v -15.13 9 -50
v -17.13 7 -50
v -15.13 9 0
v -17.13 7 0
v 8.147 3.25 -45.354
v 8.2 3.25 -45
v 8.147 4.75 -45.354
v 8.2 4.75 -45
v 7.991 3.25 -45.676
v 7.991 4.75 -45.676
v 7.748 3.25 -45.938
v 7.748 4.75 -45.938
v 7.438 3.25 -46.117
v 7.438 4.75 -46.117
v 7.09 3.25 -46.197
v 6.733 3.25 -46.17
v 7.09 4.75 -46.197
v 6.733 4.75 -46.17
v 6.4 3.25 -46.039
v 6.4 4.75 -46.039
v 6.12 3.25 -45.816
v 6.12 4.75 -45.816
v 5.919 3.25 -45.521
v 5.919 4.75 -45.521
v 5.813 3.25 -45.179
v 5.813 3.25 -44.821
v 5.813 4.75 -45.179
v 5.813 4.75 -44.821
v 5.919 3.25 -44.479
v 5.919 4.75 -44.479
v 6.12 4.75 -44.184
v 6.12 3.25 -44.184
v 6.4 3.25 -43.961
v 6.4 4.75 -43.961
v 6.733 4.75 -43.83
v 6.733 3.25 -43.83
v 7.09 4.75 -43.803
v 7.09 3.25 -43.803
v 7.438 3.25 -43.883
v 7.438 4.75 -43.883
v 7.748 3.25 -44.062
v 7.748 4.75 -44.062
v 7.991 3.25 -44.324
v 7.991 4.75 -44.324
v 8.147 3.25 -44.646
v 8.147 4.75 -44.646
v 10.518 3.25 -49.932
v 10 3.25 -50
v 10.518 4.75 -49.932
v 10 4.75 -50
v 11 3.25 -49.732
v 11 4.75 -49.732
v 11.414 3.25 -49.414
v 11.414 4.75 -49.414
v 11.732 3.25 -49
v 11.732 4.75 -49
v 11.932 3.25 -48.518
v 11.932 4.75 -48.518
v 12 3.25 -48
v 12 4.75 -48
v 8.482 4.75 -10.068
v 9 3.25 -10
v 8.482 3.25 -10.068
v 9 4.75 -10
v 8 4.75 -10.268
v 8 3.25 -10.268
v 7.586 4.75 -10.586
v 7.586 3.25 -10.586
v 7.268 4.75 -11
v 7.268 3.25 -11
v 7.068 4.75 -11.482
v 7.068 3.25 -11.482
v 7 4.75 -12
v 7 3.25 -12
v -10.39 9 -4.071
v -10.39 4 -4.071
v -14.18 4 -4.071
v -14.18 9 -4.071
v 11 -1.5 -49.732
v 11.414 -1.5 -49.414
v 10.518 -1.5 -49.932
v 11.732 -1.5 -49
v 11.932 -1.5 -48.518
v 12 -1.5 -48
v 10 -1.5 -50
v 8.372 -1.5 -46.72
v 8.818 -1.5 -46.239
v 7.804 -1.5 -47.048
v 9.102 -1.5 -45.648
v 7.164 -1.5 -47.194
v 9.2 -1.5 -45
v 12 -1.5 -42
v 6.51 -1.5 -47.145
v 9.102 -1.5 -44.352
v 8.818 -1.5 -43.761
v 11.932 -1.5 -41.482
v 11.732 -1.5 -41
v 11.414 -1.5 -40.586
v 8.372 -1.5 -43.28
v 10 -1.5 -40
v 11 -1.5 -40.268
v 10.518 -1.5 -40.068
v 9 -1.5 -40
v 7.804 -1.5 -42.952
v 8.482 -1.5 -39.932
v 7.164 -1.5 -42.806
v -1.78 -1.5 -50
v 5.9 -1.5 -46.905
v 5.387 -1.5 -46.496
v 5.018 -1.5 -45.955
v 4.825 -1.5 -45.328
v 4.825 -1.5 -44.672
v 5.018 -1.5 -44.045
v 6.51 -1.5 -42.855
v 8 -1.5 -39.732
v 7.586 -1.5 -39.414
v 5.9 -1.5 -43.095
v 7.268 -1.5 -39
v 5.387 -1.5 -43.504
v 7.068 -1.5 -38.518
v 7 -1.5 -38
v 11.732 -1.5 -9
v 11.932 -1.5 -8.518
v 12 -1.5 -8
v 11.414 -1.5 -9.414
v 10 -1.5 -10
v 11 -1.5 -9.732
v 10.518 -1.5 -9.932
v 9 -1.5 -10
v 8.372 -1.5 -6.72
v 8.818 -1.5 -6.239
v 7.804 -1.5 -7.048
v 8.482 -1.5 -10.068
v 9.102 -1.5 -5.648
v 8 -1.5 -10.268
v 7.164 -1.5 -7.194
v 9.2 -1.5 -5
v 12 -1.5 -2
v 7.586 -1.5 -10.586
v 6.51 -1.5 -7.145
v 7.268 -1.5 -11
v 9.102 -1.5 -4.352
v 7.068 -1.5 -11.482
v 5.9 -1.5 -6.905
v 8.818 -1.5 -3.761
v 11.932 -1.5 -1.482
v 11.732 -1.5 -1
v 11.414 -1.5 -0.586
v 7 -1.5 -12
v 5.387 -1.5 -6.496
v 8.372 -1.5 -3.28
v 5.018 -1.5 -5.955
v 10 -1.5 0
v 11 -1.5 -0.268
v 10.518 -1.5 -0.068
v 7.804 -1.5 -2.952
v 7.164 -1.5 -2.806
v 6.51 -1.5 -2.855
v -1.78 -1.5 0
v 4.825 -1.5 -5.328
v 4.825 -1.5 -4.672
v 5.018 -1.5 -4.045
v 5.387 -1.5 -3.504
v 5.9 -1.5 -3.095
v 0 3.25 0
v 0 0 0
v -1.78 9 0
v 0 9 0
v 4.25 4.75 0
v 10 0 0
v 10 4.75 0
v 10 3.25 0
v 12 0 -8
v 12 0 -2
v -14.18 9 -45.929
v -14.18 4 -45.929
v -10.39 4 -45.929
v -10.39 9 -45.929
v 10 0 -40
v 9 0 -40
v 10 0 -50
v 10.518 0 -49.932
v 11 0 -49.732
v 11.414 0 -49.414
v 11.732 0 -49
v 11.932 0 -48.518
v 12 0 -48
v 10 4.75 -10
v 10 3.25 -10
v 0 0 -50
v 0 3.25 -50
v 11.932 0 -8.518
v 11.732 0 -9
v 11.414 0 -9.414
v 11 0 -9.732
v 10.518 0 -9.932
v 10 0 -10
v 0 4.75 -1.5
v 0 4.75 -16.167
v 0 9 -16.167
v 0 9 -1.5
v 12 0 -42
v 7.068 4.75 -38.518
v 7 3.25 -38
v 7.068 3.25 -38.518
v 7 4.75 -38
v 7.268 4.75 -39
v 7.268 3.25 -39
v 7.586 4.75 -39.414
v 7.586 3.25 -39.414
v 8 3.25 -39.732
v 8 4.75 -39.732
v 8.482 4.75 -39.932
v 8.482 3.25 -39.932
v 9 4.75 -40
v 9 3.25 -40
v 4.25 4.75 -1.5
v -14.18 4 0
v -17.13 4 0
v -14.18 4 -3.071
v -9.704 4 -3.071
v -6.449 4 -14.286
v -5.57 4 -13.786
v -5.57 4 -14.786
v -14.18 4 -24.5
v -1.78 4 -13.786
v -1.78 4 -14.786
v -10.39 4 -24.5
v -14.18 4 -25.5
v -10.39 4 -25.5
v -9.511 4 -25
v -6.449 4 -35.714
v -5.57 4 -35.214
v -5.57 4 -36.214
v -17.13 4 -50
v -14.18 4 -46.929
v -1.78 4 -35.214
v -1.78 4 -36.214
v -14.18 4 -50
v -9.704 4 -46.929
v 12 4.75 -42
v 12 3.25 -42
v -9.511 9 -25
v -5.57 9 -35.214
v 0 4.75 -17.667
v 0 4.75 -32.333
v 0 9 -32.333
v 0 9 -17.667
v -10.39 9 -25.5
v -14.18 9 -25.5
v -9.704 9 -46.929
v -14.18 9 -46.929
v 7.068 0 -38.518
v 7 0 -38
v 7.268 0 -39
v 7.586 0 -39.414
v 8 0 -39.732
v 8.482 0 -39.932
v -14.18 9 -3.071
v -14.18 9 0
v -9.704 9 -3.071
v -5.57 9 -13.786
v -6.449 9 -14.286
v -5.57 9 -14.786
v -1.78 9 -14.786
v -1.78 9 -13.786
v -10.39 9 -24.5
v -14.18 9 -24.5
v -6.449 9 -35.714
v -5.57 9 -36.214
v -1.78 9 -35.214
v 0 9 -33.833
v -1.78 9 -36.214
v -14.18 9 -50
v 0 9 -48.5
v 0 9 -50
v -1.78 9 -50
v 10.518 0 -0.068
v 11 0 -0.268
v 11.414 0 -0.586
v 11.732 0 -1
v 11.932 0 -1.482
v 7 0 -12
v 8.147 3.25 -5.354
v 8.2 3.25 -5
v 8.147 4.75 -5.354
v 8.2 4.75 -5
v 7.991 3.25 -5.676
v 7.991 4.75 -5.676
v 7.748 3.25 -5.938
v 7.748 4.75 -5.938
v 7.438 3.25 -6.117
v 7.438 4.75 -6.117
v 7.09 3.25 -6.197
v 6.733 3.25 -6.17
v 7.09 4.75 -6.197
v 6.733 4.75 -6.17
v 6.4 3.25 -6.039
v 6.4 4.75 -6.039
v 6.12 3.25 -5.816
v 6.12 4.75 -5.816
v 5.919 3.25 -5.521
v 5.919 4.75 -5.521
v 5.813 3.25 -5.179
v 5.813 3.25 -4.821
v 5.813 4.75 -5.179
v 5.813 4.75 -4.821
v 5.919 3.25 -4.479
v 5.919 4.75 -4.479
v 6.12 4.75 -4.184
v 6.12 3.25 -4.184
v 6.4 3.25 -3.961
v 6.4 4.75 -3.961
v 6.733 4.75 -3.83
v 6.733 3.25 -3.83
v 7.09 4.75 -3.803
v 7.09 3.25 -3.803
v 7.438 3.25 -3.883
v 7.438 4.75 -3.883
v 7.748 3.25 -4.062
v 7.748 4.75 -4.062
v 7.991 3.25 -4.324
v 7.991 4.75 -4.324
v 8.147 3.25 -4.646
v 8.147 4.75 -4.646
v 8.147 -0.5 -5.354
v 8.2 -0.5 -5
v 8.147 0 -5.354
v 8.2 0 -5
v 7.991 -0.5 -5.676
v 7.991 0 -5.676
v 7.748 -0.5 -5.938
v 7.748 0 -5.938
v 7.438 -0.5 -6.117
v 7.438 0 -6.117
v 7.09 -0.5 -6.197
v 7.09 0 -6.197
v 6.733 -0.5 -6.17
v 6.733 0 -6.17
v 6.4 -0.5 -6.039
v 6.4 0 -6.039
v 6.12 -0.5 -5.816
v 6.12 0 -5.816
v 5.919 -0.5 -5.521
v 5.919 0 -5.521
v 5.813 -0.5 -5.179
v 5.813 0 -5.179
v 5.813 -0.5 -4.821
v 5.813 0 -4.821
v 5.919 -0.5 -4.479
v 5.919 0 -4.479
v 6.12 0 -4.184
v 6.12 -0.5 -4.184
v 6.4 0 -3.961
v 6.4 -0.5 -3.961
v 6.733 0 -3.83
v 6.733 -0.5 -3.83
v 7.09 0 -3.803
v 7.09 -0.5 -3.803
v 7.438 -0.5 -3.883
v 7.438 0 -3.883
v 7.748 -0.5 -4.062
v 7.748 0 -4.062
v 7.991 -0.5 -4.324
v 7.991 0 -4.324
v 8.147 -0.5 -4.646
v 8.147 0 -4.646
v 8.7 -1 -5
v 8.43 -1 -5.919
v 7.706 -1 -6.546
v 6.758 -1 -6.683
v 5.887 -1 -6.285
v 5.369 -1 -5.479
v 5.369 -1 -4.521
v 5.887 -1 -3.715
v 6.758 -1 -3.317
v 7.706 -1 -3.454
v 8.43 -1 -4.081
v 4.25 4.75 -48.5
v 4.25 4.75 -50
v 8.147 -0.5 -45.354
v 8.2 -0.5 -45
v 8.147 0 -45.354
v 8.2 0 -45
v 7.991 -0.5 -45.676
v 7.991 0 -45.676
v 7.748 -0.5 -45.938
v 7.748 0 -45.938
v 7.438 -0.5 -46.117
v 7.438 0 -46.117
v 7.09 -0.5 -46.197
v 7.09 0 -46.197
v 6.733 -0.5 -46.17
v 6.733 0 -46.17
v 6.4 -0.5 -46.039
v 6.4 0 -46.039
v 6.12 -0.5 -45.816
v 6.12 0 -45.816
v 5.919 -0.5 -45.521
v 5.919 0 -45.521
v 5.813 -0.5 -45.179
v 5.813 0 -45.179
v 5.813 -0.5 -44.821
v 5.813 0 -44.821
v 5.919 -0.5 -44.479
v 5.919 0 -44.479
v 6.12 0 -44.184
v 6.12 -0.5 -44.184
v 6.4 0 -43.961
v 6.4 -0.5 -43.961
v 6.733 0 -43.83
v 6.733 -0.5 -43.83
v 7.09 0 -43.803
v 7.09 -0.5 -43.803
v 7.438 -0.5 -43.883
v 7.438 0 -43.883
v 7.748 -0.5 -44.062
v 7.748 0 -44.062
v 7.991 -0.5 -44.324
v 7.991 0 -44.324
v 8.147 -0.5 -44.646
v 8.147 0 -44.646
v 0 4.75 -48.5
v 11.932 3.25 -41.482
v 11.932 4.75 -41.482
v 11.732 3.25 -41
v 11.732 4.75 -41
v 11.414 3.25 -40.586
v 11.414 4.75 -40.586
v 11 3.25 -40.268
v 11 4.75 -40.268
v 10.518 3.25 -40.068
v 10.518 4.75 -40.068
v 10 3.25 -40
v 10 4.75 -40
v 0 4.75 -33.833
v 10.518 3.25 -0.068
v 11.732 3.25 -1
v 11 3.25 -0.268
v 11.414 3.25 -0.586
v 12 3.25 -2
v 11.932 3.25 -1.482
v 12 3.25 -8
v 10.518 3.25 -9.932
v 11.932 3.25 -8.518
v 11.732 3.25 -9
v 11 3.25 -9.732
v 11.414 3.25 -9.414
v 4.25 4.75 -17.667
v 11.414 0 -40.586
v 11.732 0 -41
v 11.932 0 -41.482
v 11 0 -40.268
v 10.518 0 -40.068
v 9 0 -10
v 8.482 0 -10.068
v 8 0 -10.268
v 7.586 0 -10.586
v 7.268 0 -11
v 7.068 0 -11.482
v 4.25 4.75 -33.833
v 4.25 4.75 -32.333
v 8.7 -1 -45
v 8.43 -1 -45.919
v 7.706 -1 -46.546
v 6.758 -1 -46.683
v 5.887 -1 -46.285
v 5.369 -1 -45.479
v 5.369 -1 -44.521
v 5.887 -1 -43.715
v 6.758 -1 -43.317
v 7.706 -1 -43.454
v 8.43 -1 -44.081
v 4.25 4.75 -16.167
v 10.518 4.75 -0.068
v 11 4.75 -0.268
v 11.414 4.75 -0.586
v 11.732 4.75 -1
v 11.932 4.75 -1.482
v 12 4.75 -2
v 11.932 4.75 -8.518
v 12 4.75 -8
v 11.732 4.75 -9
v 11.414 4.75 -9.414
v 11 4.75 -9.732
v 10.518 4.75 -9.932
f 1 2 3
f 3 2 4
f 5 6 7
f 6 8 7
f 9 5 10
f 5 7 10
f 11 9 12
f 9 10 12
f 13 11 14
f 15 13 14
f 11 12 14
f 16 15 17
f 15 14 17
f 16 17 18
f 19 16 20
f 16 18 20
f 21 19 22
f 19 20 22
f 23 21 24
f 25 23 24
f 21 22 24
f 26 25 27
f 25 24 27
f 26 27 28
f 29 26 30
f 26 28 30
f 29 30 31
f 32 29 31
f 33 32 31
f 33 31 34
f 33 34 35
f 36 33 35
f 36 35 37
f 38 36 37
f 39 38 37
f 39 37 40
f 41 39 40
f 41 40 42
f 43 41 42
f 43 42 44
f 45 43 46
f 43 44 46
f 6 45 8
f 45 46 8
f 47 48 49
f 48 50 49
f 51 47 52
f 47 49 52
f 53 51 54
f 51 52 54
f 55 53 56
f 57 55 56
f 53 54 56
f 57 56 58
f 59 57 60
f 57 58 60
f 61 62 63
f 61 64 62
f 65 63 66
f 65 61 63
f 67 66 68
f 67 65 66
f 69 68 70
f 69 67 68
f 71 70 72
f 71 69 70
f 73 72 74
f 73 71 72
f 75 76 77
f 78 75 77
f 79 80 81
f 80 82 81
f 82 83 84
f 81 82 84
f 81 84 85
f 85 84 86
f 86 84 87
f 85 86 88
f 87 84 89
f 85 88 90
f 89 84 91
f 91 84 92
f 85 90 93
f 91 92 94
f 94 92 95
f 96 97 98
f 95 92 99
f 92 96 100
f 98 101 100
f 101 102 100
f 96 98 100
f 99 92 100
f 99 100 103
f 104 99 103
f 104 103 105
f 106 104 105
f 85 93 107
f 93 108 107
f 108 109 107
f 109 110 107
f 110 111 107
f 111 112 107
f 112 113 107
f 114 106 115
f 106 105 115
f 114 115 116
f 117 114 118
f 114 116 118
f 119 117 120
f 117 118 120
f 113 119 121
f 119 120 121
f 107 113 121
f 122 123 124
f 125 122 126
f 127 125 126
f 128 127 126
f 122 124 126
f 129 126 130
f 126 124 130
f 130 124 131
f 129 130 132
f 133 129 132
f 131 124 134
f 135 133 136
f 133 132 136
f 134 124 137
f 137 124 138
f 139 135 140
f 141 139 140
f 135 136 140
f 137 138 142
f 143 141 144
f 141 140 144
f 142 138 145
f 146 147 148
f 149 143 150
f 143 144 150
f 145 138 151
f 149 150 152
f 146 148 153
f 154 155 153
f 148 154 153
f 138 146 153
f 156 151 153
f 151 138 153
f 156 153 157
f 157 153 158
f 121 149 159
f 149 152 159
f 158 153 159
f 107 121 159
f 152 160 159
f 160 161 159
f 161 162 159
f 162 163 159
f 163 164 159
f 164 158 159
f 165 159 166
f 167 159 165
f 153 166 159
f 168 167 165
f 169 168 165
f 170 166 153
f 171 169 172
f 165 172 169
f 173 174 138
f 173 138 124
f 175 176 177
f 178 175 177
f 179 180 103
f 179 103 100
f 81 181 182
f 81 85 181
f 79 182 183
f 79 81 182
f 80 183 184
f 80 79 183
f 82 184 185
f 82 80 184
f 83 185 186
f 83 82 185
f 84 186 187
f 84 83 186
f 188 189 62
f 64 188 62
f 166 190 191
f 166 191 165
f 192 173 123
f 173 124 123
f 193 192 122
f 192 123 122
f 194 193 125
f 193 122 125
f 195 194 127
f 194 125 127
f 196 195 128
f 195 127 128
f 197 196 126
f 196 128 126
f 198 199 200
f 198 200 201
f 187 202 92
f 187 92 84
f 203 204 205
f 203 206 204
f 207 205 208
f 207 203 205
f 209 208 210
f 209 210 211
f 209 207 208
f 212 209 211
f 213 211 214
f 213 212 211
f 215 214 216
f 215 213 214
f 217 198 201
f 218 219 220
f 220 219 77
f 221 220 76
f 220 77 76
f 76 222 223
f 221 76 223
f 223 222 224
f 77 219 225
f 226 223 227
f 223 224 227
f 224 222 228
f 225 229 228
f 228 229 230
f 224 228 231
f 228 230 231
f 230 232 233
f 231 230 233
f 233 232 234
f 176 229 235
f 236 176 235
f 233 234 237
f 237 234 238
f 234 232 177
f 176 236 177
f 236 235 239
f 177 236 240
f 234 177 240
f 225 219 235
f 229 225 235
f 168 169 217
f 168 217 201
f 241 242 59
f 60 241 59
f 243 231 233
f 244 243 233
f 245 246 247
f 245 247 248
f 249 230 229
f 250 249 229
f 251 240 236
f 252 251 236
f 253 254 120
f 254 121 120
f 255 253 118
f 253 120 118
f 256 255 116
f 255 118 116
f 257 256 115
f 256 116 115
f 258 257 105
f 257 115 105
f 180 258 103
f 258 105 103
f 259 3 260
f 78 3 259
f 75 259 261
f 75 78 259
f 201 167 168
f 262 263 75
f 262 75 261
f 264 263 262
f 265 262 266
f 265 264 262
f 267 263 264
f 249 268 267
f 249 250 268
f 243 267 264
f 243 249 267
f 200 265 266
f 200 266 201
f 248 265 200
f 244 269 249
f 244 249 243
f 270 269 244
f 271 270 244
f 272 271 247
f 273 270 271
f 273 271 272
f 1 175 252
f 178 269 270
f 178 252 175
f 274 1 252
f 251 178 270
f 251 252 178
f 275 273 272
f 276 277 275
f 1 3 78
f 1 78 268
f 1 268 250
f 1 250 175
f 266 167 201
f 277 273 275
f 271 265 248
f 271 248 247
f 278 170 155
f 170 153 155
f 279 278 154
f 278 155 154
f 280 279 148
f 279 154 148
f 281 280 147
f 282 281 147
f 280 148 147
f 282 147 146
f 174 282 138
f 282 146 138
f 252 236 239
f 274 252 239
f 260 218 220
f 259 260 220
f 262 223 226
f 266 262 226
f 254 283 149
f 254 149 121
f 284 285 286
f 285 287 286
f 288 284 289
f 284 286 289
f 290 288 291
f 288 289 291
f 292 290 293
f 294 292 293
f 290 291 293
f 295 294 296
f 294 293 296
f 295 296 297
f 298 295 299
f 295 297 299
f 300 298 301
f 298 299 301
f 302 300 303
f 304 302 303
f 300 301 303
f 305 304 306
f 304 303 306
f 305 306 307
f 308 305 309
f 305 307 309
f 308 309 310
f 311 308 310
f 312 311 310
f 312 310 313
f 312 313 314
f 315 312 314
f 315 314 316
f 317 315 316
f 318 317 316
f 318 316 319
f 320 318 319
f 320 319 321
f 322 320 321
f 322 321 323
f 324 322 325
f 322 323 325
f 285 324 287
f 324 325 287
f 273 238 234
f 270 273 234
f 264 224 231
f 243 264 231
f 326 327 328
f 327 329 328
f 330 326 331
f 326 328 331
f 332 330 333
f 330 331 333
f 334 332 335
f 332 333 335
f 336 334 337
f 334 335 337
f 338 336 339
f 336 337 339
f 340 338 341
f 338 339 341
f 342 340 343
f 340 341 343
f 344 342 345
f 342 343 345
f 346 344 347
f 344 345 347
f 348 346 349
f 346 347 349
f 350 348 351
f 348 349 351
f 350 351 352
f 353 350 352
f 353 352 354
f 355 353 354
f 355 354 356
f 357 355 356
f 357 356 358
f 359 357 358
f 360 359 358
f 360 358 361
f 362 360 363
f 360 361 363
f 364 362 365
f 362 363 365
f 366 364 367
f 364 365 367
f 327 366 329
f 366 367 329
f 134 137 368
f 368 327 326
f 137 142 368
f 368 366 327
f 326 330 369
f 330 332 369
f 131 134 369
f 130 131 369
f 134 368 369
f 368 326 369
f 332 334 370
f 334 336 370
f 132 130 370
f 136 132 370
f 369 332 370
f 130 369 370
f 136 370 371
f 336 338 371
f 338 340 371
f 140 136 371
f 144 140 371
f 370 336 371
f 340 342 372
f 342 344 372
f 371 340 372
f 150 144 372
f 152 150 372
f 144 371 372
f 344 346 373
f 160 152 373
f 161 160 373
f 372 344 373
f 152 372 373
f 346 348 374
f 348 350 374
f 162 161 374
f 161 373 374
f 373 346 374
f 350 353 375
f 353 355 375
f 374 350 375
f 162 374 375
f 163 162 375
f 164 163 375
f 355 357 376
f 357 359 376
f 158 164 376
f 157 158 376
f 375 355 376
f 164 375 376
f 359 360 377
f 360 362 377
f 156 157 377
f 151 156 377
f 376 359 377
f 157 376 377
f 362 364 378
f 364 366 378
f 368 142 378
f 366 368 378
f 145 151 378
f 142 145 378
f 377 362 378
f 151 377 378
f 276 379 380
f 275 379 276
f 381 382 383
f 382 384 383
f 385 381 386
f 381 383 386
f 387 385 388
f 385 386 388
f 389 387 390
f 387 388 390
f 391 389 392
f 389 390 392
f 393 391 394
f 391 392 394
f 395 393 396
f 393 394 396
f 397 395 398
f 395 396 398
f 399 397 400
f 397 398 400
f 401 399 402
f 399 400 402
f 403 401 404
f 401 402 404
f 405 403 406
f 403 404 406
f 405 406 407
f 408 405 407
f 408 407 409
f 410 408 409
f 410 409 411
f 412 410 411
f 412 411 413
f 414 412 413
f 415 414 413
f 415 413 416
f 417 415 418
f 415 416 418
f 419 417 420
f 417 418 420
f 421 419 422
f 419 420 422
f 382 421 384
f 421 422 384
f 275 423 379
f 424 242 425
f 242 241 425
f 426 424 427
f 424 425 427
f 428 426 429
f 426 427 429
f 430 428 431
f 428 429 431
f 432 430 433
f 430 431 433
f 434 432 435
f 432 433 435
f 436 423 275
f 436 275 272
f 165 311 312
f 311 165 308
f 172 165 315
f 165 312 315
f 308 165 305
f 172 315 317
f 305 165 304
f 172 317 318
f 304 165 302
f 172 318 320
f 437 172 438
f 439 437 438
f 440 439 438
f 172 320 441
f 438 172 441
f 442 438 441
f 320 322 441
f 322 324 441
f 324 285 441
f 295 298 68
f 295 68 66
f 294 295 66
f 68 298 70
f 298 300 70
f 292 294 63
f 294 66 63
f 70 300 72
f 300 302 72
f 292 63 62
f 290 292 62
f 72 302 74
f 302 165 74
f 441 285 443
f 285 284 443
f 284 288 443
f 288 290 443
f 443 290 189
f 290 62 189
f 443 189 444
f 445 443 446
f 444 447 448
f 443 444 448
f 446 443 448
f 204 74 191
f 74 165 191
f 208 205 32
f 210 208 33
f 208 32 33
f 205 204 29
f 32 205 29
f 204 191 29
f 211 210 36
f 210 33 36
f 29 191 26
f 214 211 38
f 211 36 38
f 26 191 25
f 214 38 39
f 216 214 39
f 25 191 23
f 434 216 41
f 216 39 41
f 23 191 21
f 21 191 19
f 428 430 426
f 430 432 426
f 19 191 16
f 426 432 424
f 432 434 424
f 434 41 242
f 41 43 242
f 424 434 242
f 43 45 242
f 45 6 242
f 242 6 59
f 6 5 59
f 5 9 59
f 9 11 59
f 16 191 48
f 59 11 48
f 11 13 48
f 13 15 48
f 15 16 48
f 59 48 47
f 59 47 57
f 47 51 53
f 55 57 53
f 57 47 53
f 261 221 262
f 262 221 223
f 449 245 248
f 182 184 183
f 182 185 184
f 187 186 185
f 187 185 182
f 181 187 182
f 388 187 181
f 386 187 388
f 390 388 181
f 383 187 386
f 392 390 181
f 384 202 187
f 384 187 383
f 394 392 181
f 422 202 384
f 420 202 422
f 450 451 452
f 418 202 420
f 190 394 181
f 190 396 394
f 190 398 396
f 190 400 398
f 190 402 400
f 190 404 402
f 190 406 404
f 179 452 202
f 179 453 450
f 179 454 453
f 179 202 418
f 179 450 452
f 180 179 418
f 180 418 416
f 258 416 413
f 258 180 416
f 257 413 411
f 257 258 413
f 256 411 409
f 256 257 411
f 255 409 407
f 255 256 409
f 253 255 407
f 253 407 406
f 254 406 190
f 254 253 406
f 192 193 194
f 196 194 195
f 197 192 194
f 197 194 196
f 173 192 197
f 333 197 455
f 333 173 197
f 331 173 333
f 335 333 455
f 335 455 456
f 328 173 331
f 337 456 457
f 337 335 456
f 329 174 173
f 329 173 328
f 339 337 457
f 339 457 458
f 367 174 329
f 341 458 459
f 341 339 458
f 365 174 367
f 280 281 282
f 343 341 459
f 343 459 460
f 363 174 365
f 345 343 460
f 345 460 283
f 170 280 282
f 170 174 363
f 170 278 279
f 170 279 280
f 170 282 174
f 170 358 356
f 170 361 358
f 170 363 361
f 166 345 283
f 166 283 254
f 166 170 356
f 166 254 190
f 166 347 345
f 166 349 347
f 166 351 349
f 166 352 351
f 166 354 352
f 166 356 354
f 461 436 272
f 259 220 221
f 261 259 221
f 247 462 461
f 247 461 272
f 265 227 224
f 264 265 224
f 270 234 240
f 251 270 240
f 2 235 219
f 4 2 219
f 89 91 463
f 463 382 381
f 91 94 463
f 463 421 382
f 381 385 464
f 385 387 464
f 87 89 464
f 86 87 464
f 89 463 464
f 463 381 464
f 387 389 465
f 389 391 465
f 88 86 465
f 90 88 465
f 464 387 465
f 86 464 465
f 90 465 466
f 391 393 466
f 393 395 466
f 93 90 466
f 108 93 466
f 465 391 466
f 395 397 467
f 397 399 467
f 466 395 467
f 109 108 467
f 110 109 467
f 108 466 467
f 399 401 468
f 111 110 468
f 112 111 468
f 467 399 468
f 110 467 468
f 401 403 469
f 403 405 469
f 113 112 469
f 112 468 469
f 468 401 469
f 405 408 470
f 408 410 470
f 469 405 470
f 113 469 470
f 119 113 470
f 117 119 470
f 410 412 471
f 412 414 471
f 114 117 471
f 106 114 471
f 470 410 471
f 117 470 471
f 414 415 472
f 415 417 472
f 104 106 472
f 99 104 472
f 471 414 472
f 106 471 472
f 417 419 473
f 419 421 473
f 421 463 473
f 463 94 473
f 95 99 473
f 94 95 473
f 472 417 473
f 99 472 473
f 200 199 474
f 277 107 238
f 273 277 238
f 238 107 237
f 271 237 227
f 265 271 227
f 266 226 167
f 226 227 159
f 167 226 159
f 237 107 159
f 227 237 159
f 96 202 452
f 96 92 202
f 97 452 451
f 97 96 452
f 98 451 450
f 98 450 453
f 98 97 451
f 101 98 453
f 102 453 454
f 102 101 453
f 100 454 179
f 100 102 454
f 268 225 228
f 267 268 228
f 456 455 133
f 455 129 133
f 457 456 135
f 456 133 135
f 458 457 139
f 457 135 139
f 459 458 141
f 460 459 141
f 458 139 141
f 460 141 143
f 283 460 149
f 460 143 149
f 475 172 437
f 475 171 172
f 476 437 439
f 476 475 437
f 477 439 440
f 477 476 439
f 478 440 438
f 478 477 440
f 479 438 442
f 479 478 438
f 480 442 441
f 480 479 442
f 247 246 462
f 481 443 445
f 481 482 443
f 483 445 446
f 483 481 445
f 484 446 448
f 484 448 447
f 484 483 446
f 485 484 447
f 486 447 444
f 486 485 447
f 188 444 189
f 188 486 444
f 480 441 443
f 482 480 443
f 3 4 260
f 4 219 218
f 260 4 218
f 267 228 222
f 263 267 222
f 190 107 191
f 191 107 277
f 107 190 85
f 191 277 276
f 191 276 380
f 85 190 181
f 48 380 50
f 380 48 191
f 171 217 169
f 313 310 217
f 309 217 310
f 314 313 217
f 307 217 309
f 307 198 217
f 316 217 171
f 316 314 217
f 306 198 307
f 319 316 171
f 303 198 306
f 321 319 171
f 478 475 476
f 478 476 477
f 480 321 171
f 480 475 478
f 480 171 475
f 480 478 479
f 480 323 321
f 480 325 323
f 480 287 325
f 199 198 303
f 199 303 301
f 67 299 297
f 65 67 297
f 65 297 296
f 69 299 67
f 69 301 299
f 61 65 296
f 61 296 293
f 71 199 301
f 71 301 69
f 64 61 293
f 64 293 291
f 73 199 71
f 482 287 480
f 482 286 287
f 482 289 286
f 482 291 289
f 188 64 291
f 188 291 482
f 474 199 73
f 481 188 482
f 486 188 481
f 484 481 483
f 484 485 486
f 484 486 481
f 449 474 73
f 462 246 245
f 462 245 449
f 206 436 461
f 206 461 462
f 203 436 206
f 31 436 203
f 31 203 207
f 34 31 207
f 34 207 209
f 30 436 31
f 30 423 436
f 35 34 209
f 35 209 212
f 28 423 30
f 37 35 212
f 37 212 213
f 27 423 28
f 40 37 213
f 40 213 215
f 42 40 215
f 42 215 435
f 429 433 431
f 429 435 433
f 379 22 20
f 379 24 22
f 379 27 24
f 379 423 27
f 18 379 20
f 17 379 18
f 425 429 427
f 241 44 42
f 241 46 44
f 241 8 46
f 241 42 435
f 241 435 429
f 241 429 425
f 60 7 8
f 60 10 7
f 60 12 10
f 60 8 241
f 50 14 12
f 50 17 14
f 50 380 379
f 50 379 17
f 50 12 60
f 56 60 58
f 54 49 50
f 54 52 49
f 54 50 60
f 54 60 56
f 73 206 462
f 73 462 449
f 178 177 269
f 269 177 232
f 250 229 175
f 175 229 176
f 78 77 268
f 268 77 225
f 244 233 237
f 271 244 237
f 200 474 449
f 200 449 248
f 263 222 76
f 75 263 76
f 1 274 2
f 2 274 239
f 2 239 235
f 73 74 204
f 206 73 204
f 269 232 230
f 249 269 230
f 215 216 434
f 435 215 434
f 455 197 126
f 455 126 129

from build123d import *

# Parameters (mm, degrees)
BOSS_EXTRUDE1_DEPTH                             = 5
BOSS_EXTRUDE3_DEPTH                             = 1.5
BOSS_EXTRUDE4_REACH                             = 55.614
SKETCH5_3_W                                     = 1.78
SKETCH5_3_H                                     = 50
BOSS_EXTRUDE5_DEPTH                             = 1.5
FILLET1_R                                       = 2
CSK_FOR_M2_FLAT_HEAD_MACHINE_SCREW2_D           = 2.4
CSK_FOR_M2_FLAT_HEAD_MACHINE_SCREW2_CSINK_D     = 4.4
CSK_FOR_M2_FLAT_HEAD_MACHINE_SCREW2_CSINK_ANGLE = 90
CHAMFER1_SIZE                                   = 2
BOSS_EXTRUDE6_DEPTH                             = 1.5
LPATTERN1_COUNT                                 = 4
LPATTERN1_PITCH                                 = 16.166666667


with BuildPart() as part:
    # Sketch1 → Boss-Extrude1 (new body)
    with BuildSketch(Plane(origin=(0, 4, 0), x_dir=(1, 0, 0), z_dir=(0, 1, 0))):
        Polygon((-14.18, 46.928571429), (-14.18, 50), (-17.13, 50), (-17.13, 0), (-14.18, 0), (-14.18, 3.071428571), (-9.703639402, 3.071428571), (-5.570306069, 13.785714286), (-1.78, 13.785714286), (-1.78, 0), (0, 0), (0, 50), (-1.78, 50), (-1.78, 36.214285714), (-5.570306069, 36.214285714), (-9.703639402, 46.928571429), align=None)
        Polygon((-14.18, 4.071428571), (-14.18, 24.5), (-10.389693931, 24.5), (-6.449249487, 14.285714286), (-10.389693931, 4.071428571), align=None, mode=Mode.SUBTRACT)
        Polygon((-10.389693931, 45.928571429), (-6.449249487, 35.714285714), (-10.389693931, 25.5), (-14.18, 25.5), (-14.18, 45.928571429), align=None, mode=Mode.SUBTRACT)
        Polygon((-5.570306069, 14.785714286), (-9.510750513, 25), (-5.570306069, 35.214285714), (-1.78, 35.214285714), (-1.78, 14.785714286), align=None, mode=Mode.SUBTRACT)
    extrude(amount=BOSS_EXTRUDE1_DEPTH)

    # Sketch5<3> → Boss-Extrude4 (add, up to next)
    with BuildSketch(Plane.XZ, mode=Mode.PRIVATE) as boss_extrude4_sk1:
        with Locations((-0.89, -25)):
            Rectangle(SKETCH5_3_W, SKETCH5_3_H)
    boss_extrude4_tool1 = extrude(boss_extrude4_sk1.sketch, amount=-BOSS_EXTRUDE4_REACH, mode=Mode.PRIVATE) - part.part


with BuildPart() as body_2:
    # Sketch5 → Boss-Extrude3 (new body)
    with BuildSketch(Plane.XZ):
        Polygon((12, -50), (12, -40), (7, -40), (7, -10), (12, -10), (12, 0), (-1.78, 0), (-1.78, -50), align=None)
    extrude(amount=BOSS_EXTRUDE3_DEPTH)


with BuildPart() as part_1:
    add(part.part)

    add(body_2.part)  # Boss-Extrude4 merges body 2
    add(boss_extrude4_tool1.solids().sort_by_distance((-0.89, 0, -25))[0])

    # Sketch7 → Boss-Extrude5 (add)
    with BuildSketch(Plane(origin=(0, 3.25, 0), x_dir=(1, 0, 0), z_dir=(0, 1, 0))):
        Polygon((12, 40), (12, 50), (0, 50), (0, 0), (12, 0), (12, 10), (7, 10), (7, 40), align=None)
    extrude(amount=BOSS_EXTRUDE5_DEPTH)

    # Fillet1
    fillet1_edges = [part_1.edges().sort_by_distance(p)[0] for p in [
        (12, -0.75, -10),
        (7, -0.75, -10),
        (7, -0.75, -40),
        (12, -0.75, -40),
        (12, -0.75, -50),
        (12, -0.75, 0),
        (12, 4, -50),
        (12, 4, -40),
        (7, 4, -40),
        (7, 4, -10),
        (12, 4, -10),
        (12, 4, 0),
    ]]
    fillet(fillet1_edges, radius=FILLET1_R)

    # CSK for M2 Flat Head Machine Screw2 (through all)
    with Locations(Plane(origin=(0, -1.5, 0), x_dir=(-1, 0, 0), z_dir=(0, -1, 0))):
        with Locations((-7, 45), (-7, 5)):
            CounterSinkHole(CSK_FOR_M2_FLAT_HEAD_MACHINE_SCREW2_D / 2, CSK_FOR_M2_FLAT_HEAD_MACHINE_SCREW2_CSINK_D / 2, counter_sink_angle=CSK_FOR_M2_FLAT_HEAD_MACHINE_SCREW2_CSINK_ANGLE)

    # Chamfer1
    chamfer1_edges = [part_1.edges().sort_by_distance(p)[0] for p in [
        (-17.13, 9, -25),
    ]]
    chamfer(chamfer1_edges, length=CHAMFER1_SIZE)

    # Sketch11 → Boss-Extrude6 (add)
    with BuildSketch(Plane.XY):
        Polygon((0, 9), (0, 4.75), (4.25, 4.75), align=None)
    boss_extrude6 = extrude(amount=-BOSS_EXTRUDE6_DEPTH)

    # LPattern1: Boss-Extrude6 ×4
    with Locations(*[(0, 0, -i * LPATTERN1_PITCH) for i in range(1, LPATTERN1_COUNT)]):
        add(boss_extrude6)


solid = part_1.part
